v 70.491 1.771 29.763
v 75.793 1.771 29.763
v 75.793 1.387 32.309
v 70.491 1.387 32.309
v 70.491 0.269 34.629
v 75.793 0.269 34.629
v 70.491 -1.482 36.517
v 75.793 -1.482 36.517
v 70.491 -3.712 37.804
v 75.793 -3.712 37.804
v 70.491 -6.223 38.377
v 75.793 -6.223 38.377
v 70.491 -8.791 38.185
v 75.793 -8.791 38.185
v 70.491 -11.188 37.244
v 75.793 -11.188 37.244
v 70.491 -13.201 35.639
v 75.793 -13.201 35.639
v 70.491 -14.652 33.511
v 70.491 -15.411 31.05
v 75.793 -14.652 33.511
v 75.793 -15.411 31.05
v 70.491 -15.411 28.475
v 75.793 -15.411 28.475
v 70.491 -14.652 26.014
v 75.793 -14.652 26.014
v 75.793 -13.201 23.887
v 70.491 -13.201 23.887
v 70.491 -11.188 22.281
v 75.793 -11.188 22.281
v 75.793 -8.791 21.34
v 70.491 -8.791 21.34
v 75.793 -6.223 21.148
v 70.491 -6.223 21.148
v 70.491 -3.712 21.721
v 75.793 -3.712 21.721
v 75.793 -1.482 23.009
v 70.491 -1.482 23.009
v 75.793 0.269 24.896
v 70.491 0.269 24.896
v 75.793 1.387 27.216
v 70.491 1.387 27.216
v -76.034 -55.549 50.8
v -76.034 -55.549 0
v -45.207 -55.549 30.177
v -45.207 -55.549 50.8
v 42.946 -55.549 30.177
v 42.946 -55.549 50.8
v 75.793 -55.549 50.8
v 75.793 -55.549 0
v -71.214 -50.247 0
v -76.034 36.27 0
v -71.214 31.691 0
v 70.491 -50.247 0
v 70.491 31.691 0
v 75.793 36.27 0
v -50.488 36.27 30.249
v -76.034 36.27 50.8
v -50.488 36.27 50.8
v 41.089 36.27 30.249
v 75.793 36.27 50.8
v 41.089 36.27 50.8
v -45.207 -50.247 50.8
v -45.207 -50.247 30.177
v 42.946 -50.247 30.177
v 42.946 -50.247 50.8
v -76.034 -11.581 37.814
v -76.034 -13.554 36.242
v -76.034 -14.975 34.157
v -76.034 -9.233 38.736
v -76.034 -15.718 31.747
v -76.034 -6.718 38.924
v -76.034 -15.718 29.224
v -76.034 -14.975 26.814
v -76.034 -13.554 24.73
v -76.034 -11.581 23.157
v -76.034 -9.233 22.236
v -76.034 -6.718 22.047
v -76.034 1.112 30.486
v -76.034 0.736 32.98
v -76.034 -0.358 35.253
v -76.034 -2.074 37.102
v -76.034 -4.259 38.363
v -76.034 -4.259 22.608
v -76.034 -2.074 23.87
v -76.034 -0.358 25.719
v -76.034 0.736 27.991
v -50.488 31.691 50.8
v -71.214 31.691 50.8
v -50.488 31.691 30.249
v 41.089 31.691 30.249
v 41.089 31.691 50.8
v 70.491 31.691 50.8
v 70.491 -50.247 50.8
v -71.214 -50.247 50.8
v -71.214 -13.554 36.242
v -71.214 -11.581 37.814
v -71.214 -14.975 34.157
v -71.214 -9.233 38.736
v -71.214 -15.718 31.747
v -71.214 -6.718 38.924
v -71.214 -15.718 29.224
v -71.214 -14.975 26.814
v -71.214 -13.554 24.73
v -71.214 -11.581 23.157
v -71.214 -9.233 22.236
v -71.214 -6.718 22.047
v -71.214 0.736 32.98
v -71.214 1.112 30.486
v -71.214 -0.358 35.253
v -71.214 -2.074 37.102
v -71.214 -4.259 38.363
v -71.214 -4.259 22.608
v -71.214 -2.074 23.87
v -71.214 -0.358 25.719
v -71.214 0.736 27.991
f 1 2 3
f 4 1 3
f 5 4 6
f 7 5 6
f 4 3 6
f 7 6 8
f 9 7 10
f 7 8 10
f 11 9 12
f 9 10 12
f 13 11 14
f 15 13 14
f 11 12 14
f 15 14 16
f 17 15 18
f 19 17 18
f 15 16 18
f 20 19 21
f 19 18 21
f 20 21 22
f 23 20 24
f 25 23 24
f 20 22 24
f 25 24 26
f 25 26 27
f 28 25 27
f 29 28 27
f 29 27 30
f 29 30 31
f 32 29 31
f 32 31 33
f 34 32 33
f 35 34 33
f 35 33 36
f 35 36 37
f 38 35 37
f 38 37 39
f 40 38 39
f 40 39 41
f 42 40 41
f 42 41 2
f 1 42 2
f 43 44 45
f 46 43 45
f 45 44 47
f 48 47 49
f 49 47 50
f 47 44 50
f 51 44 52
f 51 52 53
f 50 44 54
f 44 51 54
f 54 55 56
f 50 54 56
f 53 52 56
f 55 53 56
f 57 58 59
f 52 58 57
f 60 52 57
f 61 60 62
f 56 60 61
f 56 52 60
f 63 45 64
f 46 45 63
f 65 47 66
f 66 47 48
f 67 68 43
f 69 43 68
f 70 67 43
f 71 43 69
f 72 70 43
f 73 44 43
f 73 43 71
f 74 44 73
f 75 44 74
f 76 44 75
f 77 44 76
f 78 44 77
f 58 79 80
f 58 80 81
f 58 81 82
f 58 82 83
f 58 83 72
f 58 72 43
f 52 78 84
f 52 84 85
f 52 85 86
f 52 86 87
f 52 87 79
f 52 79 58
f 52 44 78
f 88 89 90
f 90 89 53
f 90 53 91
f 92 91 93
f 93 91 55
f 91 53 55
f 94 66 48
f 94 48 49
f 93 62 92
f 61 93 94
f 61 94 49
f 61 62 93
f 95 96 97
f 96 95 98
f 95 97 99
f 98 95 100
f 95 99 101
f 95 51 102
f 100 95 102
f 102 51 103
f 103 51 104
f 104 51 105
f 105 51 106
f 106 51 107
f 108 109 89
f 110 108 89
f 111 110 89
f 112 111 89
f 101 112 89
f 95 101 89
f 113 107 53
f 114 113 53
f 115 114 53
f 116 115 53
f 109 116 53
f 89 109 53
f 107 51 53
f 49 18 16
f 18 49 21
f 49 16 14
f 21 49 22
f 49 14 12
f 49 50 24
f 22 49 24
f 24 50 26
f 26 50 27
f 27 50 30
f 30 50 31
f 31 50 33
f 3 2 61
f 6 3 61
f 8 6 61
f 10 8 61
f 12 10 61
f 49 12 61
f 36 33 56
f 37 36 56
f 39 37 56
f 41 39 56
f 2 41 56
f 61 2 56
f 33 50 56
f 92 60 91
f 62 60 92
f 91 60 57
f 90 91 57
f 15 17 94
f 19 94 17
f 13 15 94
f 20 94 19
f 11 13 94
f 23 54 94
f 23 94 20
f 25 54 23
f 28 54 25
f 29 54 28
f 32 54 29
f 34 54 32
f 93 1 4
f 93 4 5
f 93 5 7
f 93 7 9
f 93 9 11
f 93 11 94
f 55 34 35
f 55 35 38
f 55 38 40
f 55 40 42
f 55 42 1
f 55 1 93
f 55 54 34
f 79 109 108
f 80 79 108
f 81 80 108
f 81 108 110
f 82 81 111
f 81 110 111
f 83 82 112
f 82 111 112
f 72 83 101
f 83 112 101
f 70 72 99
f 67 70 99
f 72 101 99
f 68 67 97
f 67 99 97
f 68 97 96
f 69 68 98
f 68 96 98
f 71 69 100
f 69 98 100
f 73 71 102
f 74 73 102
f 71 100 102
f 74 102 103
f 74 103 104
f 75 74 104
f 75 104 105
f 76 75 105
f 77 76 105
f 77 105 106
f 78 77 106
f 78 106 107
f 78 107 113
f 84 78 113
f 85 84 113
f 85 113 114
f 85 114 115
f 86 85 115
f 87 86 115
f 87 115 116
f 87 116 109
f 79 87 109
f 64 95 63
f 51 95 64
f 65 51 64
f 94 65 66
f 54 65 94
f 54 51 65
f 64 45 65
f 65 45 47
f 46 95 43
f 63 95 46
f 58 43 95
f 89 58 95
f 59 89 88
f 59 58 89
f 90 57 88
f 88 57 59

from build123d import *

# Parameters (mm, degrees)
F0_W     = 151.8262028694
F0_H     = 91.8187052011
F0_W_2   = 141.7044624686
F0_H_2   = 81.9379538298
F1_DEPTH = 50.8
F2_W     = 88.1531722844
F2_H     = 20.622967425
F3_DEPTH = 25.4
F4_R     = 8.6388854617
F5_DEPTH = 25.4
F6_R     = 8.4622870675
F7_DEPTH = 25.4
F8_W     = 91.5777124465
F8_H     = 20.5506539524
F9_DEPTH = 25.4


with BuildPart() as f1:
    # F0 (on Top) → F1 (new body)
    with BuildSketch(Plane.XY):
        with Locations((-0.12049824, -9.6397586167)):
            Rectangle(F0_W, F0_H)
        with Locations((-0.3614909947, -9.278267622)):
            Rectangle(F0_W_2, F0_H_2, mode=Mode.SUBTRACT)
    extrude(amount=F1_DEPTH)

    # F2 (on face) → F3 (cut)
    with BuildSketch(Plane.XZ.offset(55.5491112173)):
        with Locations((-1.130355522, 40.4885162875)):
            Rectangle(F2_W, F2_H)
    extrude(amount=-F3_DEPTH, mode=Mode.SUBTRACT)

    # F4 (on face) → F5 (cut)
    with BuildSketch(Plane.YZ.offset(75.7926031947)):
        with Locations((-6.8683284335, 29.7627560794)):
            Circle(F4_R)
    extrude(amount=-F5_DEPTH, mode=Mode.SUBTRACT)

    # F6 (on face) → F7 (cut)
    with BuildSketch(Plane.YZ.offset(-71.213722229)):
        with Locations((-7.3503162712, 30.4857380688)):
            Circle(F6_R)
    extrude(amount=-F7_DEPTH, mode=Mode.SUBTRACT)

    # F8 (on face) → F9 (cut)
    with BuildSketch(Plane(origin=(0, 36.2695939839, 0), x_dir=(-1, 0, 0), z_dir=(0, 1, 0))):
        with Locations((4.6993810683, 40.5246730238)):
            Rectangle(F8_W, F8_H)
    extrude(amount=-F9_DEPTH, mode=Mode.SUBTRACT)


solid = f1.part
